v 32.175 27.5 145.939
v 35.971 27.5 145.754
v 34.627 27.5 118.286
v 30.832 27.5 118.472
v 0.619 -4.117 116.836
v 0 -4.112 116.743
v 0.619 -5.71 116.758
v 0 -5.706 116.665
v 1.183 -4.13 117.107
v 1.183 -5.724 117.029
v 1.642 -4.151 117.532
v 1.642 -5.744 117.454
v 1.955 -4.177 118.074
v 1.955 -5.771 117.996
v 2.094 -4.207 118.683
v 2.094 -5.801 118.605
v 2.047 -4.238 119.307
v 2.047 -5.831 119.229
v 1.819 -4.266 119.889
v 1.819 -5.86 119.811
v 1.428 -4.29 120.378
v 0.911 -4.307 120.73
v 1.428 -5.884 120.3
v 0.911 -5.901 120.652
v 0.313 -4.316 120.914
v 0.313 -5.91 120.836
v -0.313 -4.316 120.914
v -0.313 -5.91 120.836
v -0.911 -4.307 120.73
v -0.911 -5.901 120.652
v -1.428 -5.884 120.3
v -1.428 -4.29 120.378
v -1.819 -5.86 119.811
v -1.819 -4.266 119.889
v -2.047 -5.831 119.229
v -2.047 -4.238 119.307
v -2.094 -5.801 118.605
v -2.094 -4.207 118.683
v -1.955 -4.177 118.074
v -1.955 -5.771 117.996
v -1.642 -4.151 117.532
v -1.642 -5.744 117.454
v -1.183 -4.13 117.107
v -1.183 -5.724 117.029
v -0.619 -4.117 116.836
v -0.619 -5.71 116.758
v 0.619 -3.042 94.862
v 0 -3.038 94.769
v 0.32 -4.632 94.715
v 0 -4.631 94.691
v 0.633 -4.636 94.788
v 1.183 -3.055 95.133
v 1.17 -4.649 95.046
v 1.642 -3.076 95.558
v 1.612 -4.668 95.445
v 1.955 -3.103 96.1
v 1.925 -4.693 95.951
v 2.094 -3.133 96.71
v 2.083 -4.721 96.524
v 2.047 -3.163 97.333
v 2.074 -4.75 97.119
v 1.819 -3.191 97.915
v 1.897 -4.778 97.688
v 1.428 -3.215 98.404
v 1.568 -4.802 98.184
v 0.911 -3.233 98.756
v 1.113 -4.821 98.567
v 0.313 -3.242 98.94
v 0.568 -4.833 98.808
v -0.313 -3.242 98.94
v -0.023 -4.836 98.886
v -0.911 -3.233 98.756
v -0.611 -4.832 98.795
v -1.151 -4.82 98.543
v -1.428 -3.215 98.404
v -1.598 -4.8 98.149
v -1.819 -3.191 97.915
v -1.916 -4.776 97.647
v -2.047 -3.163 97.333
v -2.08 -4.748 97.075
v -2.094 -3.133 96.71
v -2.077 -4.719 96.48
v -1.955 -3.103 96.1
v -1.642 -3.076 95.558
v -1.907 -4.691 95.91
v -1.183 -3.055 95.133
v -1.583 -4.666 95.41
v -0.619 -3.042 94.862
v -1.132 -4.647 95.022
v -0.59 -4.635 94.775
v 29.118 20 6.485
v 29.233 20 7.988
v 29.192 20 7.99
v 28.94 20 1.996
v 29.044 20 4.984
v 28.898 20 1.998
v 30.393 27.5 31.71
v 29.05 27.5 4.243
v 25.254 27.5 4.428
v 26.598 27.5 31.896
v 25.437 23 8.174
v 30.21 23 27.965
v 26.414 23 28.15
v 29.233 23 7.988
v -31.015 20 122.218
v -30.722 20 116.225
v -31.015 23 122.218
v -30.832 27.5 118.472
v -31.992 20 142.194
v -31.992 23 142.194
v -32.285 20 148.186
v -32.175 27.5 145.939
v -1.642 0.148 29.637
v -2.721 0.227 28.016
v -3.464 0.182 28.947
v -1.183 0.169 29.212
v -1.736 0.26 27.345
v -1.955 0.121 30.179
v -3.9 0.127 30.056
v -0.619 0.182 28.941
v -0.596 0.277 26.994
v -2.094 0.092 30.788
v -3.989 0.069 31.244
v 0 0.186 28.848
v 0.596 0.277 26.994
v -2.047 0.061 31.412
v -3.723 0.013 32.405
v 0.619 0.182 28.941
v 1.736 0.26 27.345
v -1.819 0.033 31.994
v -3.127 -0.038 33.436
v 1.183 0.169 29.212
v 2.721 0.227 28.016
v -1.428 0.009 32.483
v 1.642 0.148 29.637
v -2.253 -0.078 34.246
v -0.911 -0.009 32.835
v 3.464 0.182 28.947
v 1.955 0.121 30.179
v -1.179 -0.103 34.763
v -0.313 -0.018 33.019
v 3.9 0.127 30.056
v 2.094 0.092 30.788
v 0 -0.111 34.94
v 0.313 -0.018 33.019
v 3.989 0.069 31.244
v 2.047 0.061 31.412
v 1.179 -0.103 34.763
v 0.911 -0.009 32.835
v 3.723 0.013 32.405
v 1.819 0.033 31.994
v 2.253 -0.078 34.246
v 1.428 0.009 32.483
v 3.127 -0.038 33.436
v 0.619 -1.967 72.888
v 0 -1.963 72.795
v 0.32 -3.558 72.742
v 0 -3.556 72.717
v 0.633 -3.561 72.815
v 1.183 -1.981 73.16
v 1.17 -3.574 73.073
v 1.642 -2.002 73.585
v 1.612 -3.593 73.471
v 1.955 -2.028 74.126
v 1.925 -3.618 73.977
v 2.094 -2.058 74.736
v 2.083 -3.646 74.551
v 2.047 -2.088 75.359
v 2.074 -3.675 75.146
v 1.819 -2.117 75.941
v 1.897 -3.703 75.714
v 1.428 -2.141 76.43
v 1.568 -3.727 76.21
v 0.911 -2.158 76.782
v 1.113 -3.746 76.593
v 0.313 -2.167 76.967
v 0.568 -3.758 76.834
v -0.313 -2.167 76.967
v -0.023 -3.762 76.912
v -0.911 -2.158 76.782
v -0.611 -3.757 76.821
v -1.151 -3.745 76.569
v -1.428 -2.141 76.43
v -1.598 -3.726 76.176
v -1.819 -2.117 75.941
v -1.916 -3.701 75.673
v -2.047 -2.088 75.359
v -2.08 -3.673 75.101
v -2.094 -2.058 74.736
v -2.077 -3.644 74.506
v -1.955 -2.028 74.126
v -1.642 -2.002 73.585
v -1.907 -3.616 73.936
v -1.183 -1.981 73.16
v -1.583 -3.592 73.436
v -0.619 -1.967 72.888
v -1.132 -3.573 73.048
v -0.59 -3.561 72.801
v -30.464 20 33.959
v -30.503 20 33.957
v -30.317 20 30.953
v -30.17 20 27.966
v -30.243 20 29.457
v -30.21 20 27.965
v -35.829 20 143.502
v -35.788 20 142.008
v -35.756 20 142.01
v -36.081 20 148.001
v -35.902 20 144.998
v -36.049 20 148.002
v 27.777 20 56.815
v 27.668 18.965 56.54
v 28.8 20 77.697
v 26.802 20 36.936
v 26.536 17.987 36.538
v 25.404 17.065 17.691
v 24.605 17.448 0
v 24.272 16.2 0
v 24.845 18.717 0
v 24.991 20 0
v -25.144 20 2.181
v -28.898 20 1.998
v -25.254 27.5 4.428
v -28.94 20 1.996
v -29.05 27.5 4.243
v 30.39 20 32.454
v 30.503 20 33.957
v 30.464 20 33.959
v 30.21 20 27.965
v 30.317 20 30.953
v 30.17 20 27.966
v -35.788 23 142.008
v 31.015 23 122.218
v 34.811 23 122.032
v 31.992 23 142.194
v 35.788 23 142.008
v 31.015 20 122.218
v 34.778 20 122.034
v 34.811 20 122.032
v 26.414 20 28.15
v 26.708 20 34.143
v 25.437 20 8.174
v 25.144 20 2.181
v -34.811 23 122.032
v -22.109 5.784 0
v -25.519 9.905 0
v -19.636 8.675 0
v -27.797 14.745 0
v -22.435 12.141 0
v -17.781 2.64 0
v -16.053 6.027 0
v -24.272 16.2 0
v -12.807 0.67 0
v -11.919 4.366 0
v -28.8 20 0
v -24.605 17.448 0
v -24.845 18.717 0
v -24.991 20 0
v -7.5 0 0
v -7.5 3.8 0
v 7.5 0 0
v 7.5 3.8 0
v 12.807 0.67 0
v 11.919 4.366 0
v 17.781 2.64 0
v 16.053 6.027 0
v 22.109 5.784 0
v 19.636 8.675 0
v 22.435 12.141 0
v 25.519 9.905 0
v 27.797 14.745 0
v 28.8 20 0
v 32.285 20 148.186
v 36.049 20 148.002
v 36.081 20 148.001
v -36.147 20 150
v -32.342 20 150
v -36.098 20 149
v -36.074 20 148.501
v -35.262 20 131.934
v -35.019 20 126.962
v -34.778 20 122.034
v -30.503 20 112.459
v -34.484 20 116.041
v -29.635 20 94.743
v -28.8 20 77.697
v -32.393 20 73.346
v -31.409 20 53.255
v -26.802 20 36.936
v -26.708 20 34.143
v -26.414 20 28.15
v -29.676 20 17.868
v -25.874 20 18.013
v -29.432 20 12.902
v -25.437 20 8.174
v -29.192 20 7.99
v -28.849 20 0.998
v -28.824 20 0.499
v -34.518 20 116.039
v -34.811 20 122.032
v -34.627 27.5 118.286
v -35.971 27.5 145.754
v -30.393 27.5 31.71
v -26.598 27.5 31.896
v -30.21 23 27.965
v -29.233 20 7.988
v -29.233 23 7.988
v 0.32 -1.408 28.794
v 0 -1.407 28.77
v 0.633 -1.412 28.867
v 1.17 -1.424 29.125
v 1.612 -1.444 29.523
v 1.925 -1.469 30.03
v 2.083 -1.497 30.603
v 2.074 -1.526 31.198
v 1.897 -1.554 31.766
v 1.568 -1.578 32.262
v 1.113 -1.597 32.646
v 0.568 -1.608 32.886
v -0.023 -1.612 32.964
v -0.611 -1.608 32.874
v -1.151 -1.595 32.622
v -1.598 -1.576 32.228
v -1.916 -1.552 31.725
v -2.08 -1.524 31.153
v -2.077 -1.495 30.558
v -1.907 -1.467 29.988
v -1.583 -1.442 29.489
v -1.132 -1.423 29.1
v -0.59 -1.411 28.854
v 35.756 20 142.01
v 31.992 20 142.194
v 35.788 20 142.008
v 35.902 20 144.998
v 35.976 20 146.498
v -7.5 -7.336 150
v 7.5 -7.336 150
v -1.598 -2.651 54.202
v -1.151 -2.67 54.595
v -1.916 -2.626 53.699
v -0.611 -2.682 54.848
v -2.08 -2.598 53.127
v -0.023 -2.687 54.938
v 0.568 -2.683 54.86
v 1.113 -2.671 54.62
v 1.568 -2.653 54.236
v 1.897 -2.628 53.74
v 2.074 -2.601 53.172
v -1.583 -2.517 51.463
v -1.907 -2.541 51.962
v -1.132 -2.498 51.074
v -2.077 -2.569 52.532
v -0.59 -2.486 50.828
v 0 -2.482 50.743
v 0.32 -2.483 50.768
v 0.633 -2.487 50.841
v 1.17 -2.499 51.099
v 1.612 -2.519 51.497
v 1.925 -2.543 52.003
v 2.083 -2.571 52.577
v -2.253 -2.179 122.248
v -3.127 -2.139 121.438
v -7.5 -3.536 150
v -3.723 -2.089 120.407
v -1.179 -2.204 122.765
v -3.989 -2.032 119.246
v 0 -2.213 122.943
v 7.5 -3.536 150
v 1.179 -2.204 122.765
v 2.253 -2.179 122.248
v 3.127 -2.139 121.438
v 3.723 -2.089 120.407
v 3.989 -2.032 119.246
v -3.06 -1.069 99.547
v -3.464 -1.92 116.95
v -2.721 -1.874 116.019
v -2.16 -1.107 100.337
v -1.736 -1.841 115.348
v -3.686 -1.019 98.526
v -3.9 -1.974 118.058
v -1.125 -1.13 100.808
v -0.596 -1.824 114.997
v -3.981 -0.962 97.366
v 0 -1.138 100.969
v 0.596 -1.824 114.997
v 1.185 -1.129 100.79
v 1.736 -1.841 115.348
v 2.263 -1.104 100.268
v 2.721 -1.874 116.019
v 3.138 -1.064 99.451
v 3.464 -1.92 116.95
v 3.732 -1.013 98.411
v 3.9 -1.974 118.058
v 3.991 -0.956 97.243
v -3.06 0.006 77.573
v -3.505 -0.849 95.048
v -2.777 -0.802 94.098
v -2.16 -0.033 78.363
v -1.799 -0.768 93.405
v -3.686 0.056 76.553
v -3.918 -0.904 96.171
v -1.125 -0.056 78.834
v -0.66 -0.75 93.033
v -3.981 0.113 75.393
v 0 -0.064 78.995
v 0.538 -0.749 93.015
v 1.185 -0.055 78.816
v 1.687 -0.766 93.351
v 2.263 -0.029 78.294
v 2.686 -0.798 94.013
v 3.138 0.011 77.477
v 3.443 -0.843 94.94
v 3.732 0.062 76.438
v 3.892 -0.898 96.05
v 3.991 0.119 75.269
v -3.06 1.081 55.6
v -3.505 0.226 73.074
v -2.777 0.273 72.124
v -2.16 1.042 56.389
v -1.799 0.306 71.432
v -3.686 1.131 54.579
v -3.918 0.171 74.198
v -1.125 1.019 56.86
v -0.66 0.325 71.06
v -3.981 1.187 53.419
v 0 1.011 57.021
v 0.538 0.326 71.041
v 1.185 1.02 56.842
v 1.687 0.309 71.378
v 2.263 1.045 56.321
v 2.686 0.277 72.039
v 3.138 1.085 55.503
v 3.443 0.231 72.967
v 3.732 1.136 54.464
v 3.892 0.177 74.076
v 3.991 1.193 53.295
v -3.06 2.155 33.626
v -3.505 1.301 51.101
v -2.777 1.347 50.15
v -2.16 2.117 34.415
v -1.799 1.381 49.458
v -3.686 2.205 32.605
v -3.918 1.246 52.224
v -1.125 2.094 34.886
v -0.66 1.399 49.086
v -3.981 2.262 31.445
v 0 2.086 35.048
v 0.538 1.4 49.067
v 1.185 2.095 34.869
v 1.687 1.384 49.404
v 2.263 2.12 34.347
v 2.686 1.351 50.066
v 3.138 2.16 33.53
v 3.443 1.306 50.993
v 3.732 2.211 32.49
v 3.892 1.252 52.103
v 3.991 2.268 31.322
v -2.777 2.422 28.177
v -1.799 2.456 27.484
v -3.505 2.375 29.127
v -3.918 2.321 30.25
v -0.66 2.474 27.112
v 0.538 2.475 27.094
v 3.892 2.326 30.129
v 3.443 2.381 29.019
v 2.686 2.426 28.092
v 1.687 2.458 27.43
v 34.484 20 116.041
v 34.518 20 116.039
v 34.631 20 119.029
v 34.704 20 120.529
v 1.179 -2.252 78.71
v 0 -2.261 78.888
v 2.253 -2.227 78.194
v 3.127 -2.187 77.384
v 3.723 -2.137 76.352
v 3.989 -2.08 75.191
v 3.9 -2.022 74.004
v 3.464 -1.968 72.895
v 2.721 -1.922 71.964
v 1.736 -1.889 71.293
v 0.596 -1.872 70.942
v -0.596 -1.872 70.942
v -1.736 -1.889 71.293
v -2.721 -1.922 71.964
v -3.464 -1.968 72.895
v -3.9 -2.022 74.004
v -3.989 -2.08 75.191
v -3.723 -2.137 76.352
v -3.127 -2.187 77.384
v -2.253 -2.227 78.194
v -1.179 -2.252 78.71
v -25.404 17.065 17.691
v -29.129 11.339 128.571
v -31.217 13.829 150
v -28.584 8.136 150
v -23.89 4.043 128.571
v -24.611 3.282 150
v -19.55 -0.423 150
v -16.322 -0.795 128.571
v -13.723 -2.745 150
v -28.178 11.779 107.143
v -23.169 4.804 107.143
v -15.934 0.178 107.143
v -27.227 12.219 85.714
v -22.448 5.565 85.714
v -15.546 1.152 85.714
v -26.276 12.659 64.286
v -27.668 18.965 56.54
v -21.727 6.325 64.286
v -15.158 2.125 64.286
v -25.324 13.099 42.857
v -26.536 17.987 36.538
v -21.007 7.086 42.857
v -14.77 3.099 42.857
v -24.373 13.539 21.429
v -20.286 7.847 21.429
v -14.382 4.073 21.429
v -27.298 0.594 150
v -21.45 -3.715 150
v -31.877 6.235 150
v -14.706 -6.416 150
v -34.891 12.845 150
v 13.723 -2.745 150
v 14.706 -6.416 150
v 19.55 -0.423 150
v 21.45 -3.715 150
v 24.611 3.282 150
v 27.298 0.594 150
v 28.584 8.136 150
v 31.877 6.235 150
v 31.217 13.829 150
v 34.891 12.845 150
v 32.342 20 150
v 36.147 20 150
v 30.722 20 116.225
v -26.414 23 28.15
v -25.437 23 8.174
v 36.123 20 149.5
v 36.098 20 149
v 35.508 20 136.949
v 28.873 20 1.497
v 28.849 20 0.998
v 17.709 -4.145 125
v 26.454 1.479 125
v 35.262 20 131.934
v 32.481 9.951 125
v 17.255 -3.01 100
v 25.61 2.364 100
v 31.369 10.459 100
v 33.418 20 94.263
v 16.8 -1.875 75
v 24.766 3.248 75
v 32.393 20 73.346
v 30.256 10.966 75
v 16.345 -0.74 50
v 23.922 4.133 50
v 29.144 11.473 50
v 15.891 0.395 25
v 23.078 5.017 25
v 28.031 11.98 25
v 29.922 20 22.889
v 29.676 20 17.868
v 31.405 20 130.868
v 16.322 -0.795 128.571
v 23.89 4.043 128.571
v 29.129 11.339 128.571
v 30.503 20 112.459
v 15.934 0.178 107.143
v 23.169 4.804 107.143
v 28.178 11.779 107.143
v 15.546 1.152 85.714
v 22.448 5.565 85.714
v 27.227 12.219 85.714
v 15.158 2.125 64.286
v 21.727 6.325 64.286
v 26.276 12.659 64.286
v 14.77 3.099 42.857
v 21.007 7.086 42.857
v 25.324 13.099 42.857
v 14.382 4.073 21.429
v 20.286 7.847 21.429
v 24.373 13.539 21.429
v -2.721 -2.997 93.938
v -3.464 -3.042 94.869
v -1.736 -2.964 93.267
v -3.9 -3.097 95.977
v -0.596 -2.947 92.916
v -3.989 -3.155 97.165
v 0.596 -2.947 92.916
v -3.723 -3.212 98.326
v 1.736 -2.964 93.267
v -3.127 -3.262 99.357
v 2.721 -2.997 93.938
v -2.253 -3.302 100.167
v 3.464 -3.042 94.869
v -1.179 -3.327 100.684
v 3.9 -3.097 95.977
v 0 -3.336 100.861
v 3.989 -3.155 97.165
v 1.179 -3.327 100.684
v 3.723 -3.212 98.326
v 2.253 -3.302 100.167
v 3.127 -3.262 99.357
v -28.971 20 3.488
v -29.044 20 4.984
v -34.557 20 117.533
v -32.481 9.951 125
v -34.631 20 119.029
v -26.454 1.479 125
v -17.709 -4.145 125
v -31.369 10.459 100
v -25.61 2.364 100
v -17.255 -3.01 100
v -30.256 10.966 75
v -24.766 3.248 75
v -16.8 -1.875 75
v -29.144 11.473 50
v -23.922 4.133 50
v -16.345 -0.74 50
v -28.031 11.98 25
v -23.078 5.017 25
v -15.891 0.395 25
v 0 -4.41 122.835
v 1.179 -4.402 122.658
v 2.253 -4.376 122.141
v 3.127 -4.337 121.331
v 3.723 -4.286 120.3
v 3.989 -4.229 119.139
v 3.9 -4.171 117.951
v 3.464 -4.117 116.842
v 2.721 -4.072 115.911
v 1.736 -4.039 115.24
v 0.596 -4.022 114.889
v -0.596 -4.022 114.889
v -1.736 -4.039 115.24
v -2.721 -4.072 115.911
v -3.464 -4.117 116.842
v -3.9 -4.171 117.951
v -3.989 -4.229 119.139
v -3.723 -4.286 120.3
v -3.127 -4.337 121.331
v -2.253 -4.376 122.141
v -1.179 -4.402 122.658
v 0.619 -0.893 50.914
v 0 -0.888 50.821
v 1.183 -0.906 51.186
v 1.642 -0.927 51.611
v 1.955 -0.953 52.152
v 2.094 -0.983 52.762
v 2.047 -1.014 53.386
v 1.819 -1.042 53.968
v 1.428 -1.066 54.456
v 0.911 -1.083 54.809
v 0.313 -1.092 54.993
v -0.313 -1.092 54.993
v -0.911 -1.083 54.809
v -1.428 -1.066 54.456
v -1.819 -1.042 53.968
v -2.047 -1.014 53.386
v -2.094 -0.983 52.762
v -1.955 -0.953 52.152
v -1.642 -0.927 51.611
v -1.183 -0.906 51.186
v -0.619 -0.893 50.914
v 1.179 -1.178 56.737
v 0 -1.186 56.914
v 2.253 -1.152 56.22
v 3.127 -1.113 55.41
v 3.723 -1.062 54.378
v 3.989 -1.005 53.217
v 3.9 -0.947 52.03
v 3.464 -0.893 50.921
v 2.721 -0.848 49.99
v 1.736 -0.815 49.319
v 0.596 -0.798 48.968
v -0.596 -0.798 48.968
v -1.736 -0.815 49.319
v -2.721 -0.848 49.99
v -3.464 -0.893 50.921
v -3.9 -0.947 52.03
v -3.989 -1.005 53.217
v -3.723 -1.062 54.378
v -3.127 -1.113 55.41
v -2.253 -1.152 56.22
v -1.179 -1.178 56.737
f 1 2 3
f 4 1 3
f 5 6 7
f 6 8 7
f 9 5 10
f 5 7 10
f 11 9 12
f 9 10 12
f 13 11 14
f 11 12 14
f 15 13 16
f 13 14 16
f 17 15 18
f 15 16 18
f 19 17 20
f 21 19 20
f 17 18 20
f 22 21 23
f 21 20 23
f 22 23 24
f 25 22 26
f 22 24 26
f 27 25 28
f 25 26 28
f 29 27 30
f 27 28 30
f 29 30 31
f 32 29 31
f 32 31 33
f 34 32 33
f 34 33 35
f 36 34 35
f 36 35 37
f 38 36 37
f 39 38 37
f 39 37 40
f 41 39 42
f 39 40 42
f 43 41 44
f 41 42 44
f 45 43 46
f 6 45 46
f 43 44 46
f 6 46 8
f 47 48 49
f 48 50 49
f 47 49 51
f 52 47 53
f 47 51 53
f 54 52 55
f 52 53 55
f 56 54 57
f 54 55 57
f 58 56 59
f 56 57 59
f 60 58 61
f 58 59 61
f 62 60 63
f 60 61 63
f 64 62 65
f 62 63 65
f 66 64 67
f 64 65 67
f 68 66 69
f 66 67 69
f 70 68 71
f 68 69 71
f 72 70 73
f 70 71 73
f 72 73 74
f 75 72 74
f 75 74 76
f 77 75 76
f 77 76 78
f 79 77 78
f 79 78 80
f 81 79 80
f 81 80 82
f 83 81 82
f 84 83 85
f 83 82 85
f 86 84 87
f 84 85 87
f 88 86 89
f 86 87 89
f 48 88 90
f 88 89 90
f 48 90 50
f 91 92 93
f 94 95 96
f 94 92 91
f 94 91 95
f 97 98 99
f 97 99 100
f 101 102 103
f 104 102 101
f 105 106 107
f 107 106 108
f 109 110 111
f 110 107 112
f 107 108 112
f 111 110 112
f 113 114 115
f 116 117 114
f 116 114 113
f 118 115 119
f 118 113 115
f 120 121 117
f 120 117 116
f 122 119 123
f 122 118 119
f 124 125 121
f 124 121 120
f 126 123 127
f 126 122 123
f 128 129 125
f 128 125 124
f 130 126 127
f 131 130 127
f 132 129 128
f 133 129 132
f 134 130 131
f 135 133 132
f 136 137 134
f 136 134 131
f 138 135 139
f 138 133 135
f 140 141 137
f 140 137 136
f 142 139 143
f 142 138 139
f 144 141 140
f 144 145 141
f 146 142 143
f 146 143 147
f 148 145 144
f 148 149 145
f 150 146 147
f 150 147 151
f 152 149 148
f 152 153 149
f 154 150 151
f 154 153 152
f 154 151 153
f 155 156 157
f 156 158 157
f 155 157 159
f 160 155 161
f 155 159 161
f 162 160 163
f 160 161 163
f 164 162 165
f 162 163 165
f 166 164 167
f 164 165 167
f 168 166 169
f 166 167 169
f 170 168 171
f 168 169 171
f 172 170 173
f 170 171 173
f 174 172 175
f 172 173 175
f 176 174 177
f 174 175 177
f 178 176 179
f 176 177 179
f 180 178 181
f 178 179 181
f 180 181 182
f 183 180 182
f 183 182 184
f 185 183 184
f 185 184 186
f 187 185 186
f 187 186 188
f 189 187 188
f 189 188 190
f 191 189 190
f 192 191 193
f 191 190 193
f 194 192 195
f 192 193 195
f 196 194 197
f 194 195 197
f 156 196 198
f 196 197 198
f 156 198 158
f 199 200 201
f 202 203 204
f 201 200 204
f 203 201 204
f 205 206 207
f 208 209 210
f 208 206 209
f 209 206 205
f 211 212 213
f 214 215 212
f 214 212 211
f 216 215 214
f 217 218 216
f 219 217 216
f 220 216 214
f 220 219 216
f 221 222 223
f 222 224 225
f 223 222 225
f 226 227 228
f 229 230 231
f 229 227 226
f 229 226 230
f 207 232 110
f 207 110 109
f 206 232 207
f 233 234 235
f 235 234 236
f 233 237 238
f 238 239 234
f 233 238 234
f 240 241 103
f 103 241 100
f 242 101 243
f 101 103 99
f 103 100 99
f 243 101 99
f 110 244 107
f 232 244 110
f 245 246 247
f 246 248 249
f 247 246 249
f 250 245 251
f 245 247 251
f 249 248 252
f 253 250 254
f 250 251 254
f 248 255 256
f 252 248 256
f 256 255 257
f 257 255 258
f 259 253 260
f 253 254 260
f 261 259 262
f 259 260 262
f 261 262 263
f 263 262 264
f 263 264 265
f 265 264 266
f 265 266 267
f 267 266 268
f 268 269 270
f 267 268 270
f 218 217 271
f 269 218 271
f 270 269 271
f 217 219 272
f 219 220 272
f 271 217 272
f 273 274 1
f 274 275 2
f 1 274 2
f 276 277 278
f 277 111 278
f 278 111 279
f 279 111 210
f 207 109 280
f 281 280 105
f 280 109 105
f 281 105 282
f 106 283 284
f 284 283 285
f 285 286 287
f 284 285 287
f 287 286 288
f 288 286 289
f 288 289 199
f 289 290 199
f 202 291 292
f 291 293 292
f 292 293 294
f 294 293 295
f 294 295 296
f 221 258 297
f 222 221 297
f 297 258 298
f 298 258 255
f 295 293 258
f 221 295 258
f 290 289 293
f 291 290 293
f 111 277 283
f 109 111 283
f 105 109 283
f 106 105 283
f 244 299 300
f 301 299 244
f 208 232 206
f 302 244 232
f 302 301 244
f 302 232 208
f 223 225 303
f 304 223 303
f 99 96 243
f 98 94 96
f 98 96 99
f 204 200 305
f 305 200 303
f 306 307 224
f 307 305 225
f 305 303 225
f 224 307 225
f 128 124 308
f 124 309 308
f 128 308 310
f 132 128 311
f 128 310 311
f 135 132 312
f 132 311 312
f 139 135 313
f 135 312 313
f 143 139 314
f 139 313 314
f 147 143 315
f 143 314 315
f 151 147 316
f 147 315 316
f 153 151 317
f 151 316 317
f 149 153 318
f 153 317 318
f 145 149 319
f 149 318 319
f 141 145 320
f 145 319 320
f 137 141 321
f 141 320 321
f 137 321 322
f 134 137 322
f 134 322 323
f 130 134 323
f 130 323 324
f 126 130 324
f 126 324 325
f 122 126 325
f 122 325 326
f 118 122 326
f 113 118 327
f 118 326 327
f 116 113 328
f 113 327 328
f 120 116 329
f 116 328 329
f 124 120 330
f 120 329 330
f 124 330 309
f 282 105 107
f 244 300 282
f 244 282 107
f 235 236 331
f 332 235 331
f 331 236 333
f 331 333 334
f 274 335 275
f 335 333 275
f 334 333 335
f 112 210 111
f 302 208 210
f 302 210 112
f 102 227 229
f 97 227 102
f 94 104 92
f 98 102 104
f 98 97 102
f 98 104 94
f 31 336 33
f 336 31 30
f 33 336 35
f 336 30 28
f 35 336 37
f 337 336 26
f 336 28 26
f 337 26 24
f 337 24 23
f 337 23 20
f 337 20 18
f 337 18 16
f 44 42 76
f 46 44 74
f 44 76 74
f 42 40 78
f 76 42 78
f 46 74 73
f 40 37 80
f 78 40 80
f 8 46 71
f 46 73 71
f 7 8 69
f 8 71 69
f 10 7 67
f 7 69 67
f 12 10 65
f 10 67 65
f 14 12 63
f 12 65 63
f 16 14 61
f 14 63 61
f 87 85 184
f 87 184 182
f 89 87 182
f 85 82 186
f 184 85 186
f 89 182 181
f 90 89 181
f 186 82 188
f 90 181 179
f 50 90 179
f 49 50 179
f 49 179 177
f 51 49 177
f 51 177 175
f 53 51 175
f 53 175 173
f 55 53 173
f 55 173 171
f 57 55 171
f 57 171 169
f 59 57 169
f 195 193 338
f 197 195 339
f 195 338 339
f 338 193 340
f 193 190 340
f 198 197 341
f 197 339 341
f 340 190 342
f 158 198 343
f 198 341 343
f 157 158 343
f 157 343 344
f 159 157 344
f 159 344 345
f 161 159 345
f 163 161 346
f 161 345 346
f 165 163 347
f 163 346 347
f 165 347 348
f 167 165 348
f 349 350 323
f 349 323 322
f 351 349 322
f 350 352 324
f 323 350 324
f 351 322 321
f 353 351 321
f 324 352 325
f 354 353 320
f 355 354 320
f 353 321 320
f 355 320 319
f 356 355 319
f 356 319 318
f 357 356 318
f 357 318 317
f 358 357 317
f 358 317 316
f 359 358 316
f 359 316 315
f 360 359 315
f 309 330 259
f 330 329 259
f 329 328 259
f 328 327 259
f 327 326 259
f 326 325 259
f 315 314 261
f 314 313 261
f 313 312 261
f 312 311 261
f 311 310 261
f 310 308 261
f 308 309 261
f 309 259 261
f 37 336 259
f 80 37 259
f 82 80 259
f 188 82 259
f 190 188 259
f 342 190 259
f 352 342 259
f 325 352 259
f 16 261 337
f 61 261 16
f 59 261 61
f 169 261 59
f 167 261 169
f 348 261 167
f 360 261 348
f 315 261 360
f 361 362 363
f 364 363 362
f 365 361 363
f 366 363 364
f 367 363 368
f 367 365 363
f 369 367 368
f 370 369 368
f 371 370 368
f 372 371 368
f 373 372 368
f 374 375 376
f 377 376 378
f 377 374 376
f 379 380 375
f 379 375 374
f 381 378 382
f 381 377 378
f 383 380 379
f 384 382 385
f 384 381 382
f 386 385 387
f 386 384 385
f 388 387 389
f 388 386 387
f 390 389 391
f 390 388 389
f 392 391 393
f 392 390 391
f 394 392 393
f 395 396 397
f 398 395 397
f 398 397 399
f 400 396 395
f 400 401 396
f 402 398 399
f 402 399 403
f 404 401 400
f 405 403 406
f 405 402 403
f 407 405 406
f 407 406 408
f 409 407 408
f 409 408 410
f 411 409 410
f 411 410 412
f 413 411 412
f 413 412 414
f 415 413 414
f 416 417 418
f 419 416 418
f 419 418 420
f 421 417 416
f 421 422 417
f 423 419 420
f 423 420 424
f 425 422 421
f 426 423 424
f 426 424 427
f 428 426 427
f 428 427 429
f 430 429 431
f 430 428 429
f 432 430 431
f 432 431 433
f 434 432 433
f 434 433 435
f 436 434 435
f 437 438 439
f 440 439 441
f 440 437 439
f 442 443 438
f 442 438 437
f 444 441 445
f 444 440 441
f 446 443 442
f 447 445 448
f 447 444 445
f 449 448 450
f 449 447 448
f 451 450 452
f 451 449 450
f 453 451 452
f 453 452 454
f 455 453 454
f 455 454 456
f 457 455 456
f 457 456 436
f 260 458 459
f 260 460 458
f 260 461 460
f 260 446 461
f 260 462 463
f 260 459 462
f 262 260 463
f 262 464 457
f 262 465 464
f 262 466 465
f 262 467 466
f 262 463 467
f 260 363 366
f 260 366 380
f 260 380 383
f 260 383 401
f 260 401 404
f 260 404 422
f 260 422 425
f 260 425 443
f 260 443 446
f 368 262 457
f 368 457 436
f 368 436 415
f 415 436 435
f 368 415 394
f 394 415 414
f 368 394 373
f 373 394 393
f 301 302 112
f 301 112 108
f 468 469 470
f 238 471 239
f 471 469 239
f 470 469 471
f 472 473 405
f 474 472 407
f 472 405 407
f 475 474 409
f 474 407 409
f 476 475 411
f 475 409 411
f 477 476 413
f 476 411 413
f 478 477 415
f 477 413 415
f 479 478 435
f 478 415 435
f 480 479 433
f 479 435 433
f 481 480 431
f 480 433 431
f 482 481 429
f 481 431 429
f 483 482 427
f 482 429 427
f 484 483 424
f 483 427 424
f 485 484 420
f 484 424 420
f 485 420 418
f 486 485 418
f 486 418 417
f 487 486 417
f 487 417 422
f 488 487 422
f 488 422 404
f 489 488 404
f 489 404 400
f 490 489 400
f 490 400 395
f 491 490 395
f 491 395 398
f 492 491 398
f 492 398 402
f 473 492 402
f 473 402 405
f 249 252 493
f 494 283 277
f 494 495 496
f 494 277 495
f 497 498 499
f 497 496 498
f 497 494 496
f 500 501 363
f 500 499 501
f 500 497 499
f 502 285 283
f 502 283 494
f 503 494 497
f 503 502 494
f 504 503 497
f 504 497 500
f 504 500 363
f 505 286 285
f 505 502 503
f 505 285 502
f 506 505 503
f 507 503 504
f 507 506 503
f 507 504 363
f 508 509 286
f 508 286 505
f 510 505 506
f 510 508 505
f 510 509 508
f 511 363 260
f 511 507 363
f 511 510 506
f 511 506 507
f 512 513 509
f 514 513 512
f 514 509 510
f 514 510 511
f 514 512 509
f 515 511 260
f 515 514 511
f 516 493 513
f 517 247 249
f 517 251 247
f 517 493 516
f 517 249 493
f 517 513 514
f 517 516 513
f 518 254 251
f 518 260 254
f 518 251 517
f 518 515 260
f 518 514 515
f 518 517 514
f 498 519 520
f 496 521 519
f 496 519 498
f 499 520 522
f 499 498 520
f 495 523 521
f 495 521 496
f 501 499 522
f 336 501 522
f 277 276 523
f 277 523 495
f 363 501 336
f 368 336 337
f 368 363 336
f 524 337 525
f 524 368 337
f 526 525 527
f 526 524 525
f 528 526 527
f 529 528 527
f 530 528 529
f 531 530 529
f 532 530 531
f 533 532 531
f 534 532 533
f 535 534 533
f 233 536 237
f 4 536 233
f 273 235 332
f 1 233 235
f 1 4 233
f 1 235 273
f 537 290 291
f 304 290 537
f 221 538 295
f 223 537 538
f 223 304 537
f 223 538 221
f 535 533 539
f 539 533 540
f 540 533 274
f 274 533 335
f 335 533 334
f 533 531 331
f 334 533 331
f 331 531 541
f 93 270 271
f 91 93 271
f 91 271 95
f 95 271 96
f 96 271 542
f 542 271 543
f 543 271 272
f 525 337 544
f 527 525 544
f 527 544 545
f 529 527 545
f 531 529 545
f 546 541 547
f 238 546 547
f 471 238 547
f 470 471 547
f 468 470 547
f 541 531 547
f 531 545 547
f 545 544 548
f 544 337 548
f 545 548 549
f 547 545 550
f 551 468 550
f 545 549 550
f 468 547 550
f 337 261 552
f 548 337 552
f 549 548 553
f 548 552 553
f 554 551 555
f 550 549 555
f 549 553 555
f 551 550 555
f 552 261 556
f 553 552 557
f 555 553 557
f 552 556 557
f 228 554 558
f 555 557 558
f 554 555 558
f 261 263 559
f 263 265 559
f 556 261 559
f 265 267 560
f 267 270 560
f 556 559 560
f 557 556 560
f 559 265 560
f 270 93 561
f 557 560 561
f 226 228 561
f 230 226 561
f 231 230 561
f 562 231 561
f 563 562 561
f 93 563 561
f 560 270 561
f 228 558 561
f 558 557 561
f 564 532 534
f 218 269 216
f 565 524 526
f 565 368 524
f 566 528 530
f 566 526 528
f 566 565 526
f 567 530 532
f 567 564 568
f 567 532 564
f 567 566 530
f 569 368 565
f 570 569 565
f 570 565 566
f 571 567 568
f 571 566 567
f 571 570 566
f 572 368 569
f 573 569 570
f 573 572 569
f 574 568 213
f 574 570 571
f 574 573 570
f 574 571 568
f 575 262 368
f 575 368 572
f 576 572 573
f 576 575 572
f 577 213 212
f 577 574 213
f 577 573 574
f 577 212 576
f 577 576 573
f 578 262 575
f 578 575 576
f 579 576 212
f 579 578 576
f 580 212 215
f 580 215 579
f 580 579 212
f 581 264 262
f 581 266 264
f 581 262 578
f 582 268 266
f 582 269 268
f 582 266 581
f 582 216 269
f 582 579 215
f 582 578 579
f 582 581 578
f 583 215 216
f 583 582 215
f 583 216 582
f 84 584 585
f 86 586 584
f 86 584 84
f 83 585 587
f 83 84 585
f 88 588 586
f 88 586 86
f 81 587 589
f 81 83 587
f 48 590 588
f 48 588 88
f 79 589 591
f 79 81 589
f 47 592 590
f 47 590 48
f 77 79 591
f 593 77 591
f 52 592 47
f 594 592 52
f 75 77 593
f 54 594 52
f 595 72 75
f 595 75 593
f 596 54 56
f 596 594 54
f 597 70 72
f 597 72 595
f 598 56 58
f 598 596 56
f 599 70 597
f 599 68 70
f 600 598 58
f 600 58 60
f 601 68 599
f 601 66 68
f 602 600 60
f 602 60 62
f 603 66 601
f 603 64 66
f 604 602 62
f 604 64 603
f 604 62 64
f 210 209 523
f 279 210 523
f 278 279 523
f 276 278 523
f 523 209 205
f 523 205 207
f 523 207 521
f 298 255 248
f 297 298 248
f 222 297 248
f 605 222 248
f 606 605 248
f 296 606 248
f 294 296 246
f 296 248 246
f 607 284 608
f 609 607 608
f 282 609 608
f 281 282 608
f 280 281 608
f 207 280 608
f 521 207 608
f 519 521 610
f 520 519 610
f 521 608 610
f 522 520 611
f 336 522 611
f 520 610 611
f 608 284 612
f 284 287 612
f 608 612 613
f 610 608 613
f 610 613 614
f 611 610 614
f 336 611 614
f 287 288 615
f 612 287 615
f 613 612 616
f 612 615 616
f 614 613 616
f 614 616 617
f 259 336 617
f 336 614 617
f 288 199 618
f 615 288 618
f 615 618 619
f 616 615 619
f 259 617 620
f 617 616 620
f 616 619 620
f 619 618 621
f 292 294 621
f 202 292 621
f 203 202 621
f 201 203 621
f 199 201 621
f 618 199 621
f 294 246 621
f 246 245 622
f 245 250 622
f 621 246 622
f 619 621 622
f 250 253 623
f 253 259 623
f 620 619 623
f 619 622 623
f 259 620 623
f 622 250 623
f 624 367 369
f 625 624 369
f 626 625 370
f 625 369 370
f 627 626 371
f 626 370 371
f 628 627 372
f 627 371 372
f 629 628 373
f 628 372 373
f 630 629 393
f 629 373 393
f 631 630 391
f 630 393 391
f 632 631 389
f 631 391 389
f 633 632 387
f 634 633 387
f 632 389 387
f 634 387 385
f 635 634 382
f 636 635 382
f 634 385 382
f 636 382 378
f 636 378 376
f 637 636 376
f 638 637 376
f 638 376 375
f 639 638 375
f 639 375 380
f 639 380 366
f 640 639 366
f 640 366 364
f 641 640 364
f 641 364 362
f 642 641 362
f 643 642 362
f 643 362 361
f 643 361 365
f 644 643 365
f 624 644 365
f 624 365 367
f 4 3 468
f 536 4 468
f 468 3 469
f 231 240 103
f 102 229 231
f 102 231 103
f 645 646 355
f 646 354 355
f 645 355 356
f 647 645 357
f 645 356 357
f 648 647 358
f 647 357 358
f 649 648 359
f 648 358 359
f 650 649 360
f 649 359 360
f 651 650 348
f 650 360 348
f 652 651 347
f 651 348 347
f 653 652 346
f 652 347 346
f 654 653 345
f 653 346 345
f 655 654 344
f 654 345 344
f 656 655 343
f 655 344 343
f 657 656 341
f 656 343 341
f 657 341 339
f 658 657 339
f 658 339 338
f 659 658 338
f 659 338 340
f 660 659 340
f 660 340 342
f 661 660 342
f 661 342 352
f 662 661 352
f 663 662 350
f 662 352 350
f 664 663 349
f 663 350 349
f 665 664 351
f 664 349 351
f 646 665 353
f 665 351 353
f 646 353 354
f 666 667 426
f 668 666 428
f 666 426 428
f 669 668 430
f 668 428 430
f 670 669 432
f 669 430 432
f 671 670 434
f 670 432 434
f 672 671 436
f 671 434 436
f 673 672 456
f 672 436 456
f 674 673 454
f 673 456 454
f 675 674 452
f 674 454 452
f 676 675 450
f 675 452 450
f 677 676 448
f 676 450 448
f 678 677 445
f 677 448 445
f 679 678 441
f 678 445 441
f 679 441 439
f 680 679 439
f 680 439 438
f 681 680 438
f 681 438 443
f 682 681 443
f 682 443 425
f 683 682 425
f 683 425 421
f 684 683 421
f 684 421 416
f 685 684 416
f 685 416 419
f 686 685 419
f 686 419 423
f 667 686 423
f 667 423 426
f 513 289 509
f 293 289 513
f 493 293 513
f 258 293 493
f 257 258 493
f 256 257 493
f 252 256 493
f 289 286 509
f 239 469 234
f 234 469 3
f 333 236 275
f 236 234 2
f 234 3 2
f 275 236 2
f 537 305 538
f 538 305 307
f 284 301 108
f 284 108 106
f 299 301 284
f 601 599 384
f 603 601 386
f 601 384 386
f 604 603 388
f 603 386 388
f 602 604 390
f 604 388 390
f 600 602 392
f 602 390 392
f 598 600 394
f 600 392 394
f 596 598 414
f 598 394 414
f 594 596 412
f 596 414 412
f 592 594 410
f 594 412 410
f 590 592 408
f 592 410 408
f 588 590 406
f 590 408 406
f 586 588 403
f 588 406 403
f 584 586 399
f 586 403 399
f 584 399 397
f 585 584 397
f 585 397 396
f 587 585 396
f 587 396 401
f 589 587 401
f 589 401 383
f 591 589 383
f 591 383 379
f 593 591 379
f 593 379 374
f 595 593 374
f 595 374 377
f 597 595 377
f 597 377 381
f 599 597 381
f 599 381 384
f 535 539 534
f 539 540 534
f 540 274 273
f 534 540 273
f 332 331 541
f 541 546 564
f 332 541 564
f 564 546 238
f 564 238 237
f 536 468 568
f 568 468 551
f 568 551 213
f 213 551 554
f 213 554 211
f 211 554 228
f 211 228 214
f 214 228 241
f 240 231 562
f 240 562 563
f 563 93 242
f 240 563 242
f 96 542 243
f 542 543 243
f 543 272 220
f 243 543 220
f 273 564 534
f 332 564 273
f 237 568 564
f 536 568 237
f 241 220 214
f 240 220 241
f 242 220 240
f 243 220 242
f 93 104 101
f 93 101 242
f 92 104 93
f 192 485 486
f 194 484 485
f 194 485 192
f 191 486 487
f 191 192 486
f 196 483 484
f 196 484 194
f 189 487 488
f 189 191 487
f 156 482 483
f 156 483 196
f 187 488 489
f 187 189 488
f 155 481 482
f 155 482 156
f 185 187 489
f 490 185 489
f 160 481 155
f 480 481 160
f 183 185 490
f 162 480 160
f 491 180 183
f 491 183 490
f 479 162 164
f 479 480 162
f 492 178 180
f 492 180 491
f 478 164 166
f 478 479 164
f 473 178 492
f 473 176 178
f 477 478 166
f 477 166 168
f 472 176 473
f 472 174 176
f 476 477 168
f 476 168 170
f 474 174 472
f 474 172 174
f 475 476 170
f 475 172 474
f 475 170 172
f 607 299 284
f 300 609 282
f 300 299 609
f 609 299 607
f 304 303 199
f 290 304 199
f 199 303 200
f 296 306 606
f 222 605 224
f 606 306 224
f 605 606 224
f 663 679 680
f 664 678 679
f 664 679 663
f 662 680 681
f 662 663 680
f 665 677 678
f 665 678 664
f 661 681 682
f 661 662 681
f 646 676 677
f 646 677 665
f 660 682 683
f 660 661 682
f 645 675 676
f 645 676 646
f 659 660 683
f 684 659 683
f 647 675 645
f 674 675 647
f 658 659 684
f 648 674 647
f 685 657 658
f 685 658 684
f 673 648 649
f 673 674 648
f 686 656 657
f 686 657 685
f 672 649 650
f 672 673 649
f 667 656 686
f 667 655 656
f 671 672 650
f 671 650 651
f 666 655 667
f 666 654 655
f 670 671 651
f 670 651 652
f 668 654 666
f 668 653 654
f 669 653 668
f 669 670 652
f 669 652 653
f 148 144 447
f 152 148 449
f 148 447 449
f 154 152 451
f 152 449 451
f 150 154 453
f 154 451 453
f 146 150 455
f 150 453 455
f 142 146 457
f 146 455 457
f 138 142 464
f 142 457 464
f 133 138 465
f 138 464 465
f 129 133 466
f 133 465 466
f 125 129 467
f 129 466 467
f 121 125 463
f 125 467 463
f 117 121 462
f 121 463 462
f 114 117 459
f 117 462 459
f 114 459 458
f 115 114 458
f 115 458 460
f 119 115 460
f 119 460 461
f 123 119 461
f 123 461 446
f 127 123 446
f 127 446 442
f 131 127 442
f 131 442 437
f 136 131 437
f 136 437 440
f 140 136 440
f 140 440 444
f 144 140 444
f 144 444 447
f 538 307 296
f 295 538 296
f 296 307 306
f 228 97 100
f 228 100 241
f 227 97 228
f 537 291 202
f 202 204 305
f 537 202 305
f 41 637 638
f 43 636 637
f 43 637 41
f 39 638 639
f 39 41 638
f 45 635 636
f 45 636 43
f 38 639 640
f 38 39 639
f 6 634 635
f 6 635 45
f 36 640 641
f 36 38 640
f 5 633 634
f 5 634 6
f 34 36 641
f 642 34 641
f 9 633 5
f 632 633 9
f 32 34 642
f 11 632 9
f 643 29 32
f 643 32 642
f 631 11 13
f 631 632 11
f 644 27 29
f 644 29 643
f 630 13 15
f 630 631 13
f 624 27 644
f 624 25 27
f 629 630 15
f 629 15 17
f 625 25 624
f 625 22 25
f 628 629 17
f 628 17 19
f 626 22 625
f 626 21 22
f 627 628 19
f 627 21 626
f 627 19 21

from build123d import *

# Parameters (mm, degrees)
BOSS_EXTRUDE1_DEPTH                       = 150
BOSS_EXTRUDE1_DRAFT                       = -2.8
CUT_EXTRUDE1_DEPTH                        = 157.704023919
CUT_EXTRUDE1_DRAFT                        = -2.8
SKETCH4_W                                 = 86.570961738
SKETCH4_H                                 = 17.749989686
CUT_EXTRUDE2_DEPTH                        = 157.704023919
BOSS_EXTRUDE2_DEPTH                       = 3.8
BOSS_EXTRUDE3_DEPTH                       = 3.8
CBORE_FOR_M4_SBHCS1_D                     = 4.2
CBORE_FOR_M4_SBHCS1_CBORE_D               = 8
CBORE_FOR_M4_SBHCS1_CBORE_DEPTH           = 2.2
CBORE_FOR_M4_SBHCS1_ON_FACE_2_D           = 4.2
CBORE_FOR_M4_SBHCS1_ON_FACE_2_CBORE_D     = 8
CBORE_FOR_M4_SBHCS1_ON_FACE_2_CBORE_DEPTH = 2.2
CBORE_FOR_M4_SBHCS1_ON_FACE_3_D           = 4.2
CBORE_FOR_M4_SBHCS1_ON_FACE_3_CBORE_D     = 8
CBORE_FOR_M4_SBHCS1_ON_FACE_3_CBORE_DEPTH = 2.2
CBORE_FOR_M4_SBHCS1_ON_FACE_4_D           = 4.2
CBORE_FOR_M4_SBHCS1_ON_FACE_4_CBORE_D     = 8
CBORE_FOR_M4_SBHCS1_ON_FACE_4_CBORE_DEPTH = 2.2
CBORE_FOR_M4_SBHCS1_ON_FACE_5_D           = 4.2
CBORE_FOR_M4_SBHCS1_ON_FACE_5_CBORE_D     = 8
CBORE_FOR_M4_SBHCS1_ON_FACE_5_CBORE_DEPTH = 2.2


with BuildPart() as part:
    # Sketch1 → Boss-Extrude1 (with draft: the straight prism first)
    with BuildSketch(Plane.XY):
        with BuildLine():
            ThreePointArc((-28.8, 20), (-22.10898696, 5.783678888), (-7.5, 0))
            Line((-7.5, 0), (7.5, 0))
            ThreePointArc((7.5, 0), (22.10898696, 5.783678888), (28.8, 20))
            Line((28.8, 20), (-28.8, 20))
        make_face()
    extrude(amount=BOSS_EXTRUDE1_DEPTH)
    # Boss-Extrude1: the draft: its side faces are tilted about the plane it starts from
    boss_extrude1_sides = [part.faces().sort_by_distance(p)[0] for p in [
        (22.10898696, 5.783678888, 75),
        (0, 20, 75),
        (-22.10898696, 5.783678888, 75),
        (0, 0, 75),
    ]]
    draft(boss_extrude1_sides, Plane.XY, BOSS_EXTRUDE1_DRAFT)


with BuildPart() as cut_extrude1_tool:
    # Sketch1<3> → Cut-Extrude1 (with draft: the straight prism first)
    with BuildSketch(Plane.XY):
        with BuildLine():
            Line((24.990823308, 20), (-24.990823308, 20))
            ThreePointArc((-24.990823308, 20), (-19.420244335, 8.472195219), (-7.5, 3.8))
            Line((-7.5, 3.8), (7.5, 3.8))
            ThreePointArc((7.5, 3.8), (19.420244335, 8.472195219), (24.990823308, 20))
        make_face()
    extrude(amount=CUT_EXTRUDE1_DEPTH)
    # Cut-Extrude1: the draft: its side faces are tilted about the plane it starts from
    cut_extrude1_sides = [cut_extrude1_tool.faces().sort_by_distance(p)[0] for p in [
        (0, 3.8, 78.85201196),
        (19.420244335, 8.472195219, 78.85201196),
        (0, 20, 78.85201196),
        (-19.420244335, 8.472195219, 78.85201196),
    ]]
    draft(cut_extrude1_sides, Plane.XY, CUT_EXTRUDE1_DRAFT)


with BuildPart() as part_1:
    add(part.part)

    # Cut-Extrude1: cut by cut_extrude1_tool
    add(cut_extrude1_tool.part, mode=Mode.SUBTRACT)

    # Sketch4 → Cut-Extrude2 (cut, through all)
    with BuildSketch(Plane(origin=(0, 0, 0), x_dir=(-1, 0, 0), z_dir=(0, 0, -1))):
        with Locations((0, 28.874994843)):
            Rectangle(SKETCH4_W, SKETCH4_H)
    extrude(amount=-CUT_EXTRUDE2_DEPTH, mode=Mode.SUBTRACT)

    # Sketch5 → Boss-Extrude2 (add)
    with BuildSketch(Plane(origin=(28.773423739, 0, -1.407255195), x_dir=(-0.04884976979561336, 0, -0.9988061373414341), z_dir=(0.9988061373414341, 0, -0.04884976979561336))):
        Polygon((-149.586695466, 20), (-147.336695466, 27.5), (-119.836695466, 27.5), (-117.586695466, 20), (-123.586695466, 20), (-123.586695466, 23), (-143.586695466, 23), (-143.586695466, 20), align=None)
        Polygon((-9.40687337, 23), (-9.40687337, 20), (-3.40687337, 20), (-5.65687337, 27.5), (-33.15687337, 27.5), (-35.40687337, 20), (-29.40687337, 20), (-29.40687337, 23), align=None)
    extrude(amount=-BOSS_EXTRUDE2_DEPTH)

    # Sketch6 → Boss-Extrude3 (add)
    with BuildSketch(Plane(origin=(-28.773423739, 0, -1.407255195), x_dir=(-0.04884976979561336, 0, 0.9988061373414341), z_dir=(-0.9988061373414341, 0, -0.04884976979561336))):
        Polygon((149.586695466, 20), (147.336695466, 27.5), (119.836695466, 27.5), (117.586695466, 20), (123.586695466, 20), (123.586695466, 23), (143.586695466, 23), (143.586695466, 20), align=None)
        Polygon((9.40687337, 23), (9.40687337, 20), (3.40687337, 20), (5.65687337, 27.5), (33.15687337, 27.5), (35.40687337, 20), (29.40687337, 20), (29.40687337, 23), align=None)
    extrude(amount=-BOSS_EXTRUDE3_DEPTH)

    # CBORE for M4 SBHCS1 (through all)
    with Locations(Plane(origin=(0, -2.017501828, 118.947470043), x_dir=(0, -0.048849769796, 0.998806137341), z_dir=(0, 0.998806137341, 0.048849769796))):
        with Locations((0, 0)):
            CounterBoreHole(CBORE_FOR_M4_SBHCS1_D / 2, CBORE_FOR_M4_SBHCS1_CBORE_D / 2, CBORE_FOR_M4_SBHCS1_CBORE_DEPTH)

    # CBORE for M4 SBHCS1 on face 2 (through all)
    with Locations(Plane(origin=(0, -0.942806892, 96.973735022), x_dir=(0, -0.048850006152, 0.998806125782), z_dir=(0, 0.998806125782, 0.048850006152))):
        with Locations((0, 0)):
            CounterBoreHole(CBORE_FOR_M4_SBHCS1_ON_FACE_2_D / 2, CBORE_FOR_M4_SBHCS1_ON_FACE_2_CBORE_D / 2, CBORE_FOR_M4_SBHCS1_ON_FACE_2_CBORE_DEPTH)

    # CBORE for M4 SBHCS1 on face 3 (through all)
    with Locations(Plane(origin=(0, 0.131888043, 75), x_dir=(0, -0.048850006152, 0.998806125782), z_dir=(0, 0.998806125782, 0.048850006152))):
        with Locations((0, 0)):
            CounterBoreHole(CBORE_FOR_M4_SBHCS1_ON_FACE_3_D / 2, CBORE_FOR_M4_SBHCS1_ON_FACE_3_CBORE_D / 2, CBORE_FOR_M4_SBHCS1_ON_FACE_3_CBORE_DEPTH)

    # CBORE for M4 SBHCS1 on face 4 (through all)
    with Locations(Plane(origin=(0, 1.206582979, 53.026264978), x_dir=(0, -0.048850006152, 0.998806125782), z_dir=(0, 0.998806125782, 0.048850006152))):
        with Locations((0, 0)):
            CounterBoreHole(CBORE_FOR_M4_SBHCS1_ON_FACE_4_D / 2, CBORE_FOR_M4_SBHCS1_ON_FACE_4_CBORE_D / 2, CBORE_FOR_M4_SBHCS1_ON_FACE_4_CBORE_DEPTH)

    # CBORE for M4 SBHCS1 on face 5 (through all)
    with Locations(Plane(origin=(0, 2.281277914, 31.052529957), x_dir=(0, -0.048850006152, 0.998806125782), z_dir=(0, 0.998806125782, 0.048850006152))):
        with Locations((0, 0)):
            CounterBoreHole(CBORE_FOR_M4_SBHCS1_ON_FACE_5_D / 2, CBORE_FOR_M4_SBHCS1_ON_FACE_5_CBORE_D / 2, CBORE_FOR_M4_SBHCS1_ON_FACE_5_CBORE_DEPTH)


solid = part_1.part
